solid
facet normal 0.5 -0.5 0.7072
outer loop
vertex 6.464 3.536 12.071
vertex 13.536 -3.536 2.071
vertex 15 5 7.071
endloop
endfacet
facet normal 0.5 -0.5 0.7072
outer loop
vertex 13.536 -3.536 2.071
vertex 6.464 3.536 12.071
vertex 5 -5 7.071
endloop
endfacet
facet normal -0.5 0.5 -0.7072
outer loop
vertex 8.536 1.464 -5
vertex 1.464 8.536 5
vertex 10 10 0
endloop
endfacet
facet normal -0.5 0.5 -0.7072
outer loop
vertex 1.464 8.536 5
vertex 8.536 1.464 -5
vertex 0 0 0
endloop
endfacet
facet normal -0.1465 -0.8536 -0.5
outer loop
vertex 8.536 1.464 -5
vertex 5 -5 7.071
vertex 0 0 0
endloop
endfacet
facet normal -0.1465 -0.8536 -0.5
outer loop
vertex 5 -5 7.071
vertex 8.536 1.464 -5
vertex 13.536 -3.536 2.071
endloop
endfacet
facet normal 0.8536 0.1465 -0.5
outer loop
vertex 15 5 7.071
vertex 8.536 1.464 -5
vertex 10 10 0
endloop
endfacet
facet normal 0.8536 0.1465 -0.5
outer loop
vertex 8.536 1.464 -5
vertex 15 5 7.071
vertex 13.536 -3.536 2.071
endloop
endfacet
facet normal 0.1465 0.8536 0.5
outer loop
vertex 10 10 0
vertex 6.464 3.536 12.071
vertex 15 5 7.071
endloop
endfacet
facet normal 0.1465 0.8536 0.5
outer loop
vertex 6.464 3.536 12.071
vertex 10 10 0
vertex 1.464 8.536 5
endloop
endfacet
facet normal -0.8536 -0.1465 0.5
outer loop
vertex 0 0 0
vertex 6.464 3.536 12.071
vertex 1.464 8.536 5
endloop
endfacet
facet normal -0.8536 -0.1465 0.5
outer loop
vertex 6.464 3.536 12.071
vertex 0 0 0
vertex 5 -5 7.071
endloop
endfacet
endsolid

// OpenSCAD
rotate(a=45, v=[1,1,0]) { 
	cube(size=[10, 10, 10], center=false);
}
